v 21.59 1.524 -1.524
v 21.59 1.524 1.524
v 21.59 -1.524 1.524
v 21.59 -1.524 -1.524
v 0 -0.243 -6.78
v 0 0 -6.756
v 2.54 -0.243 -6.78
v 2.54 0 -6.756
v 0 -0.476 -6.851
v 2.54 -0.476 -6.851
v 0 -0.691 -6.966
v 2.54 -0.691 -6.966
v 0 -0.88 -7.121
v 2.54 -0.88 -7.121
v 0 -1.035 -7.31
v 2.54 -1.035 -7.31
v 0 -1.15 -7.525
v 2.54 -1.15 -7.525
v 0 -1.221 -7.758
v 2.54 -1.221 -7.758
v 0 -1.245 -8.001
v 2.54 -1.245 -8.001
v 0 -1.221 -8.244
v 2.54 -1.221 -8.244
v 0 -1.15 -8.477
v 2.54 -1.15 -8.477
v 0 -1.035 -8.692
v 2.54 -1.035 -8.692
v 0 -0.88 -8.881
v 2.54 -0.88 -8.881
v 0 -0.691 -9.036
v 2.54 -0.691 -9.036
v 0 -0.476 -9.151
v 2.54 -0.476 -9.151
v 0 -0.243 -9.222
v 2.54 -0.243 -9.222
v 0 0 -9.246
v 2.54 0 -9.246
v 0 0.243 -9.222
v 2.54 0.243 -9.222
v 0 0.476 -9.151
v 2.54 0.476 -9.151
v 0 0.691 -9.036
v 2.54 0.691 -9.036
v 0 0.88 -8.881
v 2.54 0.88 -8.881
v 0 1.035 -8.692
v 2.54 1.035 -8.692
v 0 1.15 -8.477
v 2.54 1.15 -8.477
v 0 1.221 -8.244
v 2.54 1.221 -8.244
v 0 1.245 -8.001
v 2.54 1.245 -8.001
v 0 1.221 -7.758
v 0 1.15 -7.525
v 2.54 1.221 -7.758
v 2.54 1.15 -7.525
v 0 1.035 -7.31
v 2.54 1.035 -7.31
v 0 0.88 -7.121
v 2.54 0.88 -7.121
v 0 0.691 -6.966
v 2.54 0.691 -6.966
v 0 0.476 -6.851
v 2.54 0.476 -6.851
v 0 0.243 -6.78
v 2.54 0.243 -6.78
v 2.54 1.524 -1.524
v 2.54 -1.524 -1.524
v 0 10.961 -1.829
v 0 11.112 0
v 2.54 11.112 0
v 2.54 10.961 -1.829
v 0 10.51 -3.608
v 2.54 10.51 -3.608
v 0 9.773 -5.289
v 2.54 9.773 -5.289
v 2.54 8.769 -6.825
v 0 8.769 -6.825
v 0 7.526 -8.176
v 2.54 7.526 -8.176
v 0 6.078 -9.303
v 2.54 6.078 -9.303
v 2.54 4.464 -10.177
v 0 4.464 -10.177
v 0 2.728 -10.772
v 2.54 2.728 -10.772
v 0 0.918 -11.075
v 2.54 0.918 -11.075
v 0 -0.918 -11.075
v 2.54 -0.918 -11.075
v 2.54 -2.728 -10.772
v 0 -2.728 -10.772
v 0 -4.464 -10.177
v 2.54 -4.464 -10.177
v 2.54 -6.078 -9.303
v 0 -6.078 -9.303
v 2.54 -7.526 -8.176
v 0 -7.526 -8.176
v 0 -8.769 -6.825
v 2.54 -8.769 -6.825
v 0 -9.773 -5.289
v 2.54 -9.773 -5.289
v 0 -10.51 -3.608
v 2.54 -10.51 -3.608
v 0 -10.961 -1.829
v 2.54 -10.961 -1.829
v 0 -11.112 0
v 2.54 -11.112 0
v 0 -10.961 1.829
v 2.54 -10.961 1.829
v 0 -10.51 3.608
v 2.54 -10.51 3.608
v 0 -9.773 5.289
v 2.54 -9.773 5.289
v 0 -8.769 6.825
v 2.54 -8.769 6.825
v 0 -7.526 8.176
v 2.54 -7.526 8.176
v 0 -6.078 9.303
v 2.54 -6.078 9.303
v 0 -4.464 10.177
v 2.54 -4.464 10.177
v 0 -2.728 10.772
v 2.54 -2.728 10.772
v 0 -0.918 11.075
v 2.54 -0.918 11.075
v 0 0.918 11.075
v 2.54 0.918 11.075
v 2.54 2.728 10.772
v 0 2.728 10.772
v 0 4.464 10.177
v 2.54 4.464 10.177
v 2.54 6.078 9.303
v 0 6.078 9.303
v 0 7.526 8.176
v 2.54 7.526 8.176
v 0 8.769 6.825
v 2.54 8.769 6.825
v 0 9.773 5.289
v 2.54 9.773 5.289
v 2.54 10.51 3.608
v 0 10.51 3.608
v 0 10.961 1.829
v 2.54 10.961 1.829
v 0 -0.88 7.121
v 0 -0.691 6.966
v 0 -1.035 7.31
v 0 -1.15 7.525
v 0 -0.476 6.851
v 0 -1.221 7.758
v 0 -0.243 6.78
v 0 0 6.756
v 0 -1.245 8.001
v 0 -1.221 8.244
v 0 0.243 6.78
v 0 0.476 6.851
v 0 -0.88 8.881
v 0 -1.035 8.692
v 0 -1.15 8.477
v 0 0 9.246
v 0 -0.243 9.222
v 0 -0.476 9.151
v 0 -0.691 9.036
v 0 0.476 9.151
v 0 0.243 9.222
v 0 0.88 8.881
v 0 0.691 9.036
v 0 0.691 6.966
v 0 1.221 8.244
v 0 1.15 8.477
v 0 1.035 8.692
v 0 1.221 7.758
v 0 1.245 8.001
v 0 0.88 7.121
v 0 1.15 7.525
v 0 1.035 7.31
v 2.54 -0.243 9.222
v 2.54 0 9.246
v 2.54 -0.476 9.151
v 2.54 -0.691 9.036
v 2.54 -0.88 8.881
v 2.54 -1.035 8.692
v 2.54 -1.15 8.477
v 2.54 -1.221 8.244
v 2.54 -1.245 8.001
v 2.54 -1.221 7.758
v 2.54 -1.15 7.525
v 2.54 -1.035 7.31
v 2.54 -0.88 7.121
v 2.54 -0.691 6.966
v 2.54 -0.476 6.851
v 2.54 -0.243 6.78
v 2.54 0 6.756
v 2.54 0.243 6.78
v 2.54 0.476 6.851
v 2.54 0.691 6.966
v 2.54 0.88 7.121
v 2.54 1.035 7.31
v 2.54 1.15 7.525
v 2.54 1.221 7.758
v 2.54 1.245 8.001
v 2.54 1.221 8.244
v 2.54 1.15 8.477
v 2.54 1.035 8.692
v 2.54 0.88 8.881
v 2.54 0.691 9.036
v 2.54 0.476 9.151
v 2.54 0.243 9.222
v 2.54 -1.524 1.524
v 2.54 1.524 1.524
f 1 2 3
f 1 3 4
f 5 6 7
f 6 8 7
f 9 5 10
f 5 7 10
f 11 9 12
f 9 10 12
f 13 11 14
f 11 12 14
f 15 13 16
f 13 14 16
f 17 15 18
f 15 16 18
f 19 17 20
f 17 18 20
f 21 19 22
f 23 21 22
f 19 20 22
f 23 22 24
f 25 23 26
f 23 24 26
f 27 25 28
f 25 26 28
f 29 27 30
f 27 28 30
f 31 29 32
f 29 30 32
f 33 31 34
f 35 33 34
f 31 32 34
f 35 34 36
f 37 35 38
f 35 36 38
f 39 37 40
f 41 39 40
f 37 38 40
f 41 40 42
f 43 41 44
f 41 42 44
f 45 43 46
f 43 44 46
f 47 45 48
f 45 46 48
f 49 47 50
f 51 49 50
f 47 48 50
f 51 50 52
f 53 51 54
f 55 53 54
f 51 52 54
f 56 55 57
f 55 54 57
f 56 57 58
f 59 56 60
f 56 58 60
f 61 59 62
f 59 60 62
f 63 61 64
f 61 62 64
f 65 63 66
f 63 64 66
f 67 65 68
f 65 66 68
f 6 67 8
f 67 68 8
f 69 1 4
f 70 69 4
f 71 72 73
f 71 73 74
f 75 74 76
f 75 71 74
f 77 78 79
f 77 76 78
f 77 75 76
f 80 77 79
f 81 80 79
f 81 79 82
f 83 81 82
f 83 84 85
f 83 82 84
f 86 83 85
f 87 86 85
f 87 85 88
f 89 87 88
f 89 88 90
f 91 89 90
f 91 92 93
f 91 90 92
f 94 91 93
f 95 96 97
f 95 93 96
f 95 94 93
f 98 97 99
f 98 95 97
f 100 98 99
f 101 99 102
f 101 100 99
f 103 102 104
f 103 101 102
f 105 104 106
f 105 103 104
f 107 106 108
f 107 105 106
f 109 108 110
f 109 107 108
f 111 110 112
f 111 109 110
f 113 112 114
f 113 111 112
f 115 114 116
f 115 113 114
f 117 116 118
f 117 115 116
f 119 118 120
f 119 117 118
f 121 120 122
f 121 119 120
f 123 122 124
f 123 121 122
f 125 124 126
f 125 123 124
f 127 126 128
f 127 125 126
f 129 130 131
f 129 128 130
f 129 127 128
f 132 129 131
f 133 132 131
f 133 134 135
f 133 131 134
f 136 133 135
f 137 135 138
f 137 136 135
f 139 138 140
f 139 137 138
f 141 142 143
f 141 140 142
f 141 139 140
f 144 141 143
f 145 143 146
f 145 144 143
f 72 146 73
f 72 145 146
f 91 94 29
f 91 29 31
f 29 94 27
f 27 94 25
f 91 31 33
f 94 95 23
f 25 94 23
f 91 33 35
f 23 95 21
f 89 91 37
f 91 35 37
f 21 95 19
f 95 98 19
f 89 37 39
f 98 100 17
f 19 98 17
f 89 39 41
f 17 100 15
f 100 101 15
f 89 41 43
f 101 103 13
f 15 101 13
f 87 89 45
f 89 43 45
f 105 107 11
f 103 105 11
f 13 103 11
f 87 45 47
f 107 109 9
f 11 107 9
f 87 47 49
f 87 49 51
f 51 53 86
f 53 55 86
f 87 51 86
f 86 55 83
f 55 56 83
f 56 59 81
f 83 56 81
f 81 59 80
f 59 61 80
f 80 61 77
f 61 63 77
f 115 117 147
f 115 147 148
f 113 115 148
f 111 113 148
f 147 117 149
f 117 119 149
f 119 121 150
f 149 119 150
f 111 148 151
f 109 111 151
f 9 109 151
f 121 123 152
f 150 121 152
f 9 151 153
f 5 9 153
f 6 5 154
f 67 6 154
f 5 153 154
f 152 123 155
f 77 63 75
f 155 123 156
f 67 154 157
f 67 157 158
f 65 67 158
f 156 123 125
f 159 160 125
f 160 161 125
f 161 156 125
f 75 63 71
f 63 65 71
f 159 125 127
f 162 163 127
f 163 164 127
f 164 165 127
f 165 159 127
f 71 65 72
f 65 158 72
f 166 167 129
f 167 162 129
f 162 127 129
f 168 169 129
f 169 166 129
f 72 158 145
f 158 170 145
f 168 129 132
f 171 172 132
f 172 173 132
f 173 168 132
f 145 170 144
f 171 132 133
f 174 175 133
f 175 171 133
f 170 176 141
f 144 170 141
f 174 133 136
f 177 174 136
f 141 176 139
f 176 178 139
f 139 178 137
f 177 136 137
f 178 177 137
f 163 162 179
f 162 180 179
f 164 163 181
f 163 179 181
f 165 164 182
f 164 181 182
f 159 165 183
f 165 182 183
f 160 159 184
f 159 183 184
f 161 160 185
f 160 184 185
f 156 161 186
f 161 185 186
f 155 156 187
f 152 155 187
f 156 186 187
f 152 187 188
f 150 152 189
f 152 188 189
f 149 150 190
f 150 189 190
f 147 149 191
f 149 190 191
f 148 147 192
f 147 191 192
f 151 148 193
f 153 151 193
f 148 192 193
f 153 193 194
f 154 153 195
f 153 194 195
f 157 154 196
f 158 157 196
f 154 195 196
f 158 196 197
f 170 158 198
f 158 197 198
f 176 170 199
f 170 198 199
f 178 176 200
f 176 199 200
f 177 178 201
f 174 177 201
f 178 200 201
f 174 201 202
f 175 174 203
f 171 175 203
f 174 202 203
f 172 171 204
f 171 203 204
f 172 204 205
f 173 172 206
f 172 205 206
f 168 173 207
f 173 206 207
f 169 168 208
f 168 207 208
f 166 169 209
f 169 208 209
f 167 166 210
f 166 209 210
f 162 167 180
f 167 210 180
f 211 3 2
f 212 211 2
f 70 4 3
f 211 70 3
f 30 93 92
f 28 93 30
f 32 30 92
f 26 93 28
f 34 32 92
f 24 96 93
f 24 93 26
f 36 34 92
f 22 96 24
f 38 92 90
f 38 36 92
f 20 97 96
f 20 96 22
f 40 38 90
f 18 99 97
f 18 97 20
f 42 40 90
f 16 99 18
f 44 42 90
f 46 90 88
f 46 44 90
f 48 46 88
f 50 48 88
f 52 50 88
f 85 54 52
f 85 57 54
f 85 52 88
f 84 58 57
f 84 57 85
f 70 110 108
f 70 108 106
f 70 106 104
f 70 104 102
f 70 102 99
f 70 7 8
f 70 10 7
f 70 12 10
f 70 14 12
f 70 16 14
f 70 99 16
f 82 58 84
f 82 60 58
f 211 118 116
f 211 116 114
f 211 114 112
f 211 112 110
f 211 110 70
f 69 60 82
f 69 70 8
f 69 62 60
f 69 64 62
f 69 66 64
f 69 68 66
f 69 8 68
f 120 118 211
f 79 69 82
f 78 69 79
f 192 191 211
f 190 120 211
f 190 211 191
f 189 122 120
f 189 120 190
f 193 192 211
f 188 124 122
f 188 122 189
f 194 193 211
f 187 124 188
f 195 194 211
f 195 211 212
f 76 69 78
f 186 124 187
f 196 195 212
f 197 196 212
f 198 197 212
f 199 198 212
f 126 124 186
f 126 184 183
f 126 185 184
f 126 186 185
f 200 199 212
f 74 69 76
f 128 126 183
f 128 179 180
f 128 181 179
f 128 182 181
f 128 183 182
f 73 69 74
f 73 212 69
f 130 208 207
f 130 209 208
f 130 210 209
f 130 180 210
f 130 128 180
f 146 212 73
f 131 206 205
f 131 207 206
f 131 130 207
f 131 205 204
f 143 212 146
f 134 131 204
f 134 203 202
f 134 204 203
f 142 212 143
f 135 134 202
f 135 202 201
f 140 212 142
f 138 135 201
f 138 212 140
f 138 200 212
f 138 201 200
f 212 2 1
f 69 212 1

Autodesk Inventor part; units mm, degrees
ref_plane "YZ Plane" through (0, 0, 0) normal (1, 0, 0) x (0, 1, 0)
ref_plane "XZ Plane" through (0, 0, 0) normal (0, 1, 0) x (-1, 0, 0)
ref_plane "XY Plane" through (0, 0, 0) normal (0, 0, 1) x (1, 0, 0)
sketch "Sketch1" plane through (0, 0, 0) normal (1, 0, 0) x (0, 1, 0)
  circle A0 centre (0, 0) radius 11.1125
  dimension "d0" = 22.225
extrude "Extrusion1" add sketch "Sketch1" along normal blind 2.54
sketch "Sketch2" plane through (2.54, 0, 0) normal (1, 0, 0) x (0, 0, -1)
  line L0 (-1.524, 1.524) -> (1.524, 1.524)
  line L1 (1.524, 1.524) -> (1.524, -1.524)
  line L2 (1.524, -1.524) -> (-1.524, -1.524)
  line L3 (-1.524, -1.524) -> (-1.524, 1.524)
  point P0 (0, 0)
  dimension "d3" = 3.048
  dimension "d4" = 3.048
  dimension "d5" = 1.524
  dimension "d6" = 1.524
extrude "Extrusion2" add sketch "Sketch2" along normal blind 19.05
sketch "Sketch3" plane through (0, 0, 0) normal (-1, 0, 0) x (0, 0, 1)
  point P0 (0, 0)
  point P1 (-8.001, 0)
  point P2 (8.001, 0)
  dimension "d9" = 16.002
  dimension "d10" = 8.001
hole "Hole1" at (0, 0, 8.001) at (0, 0, -8.001) direction (1, 0, 0) diameter 2.4892 depth 2.54
equation "\"d4\" = d3"
equation "\"d5\" = 0.5 * d4"
equation "\"d6\" = 0.5 * d3"
equation "\"d10\" = 0.5 * d9"
properties part number "vex servo addapter" material "Aluminum 6061"
